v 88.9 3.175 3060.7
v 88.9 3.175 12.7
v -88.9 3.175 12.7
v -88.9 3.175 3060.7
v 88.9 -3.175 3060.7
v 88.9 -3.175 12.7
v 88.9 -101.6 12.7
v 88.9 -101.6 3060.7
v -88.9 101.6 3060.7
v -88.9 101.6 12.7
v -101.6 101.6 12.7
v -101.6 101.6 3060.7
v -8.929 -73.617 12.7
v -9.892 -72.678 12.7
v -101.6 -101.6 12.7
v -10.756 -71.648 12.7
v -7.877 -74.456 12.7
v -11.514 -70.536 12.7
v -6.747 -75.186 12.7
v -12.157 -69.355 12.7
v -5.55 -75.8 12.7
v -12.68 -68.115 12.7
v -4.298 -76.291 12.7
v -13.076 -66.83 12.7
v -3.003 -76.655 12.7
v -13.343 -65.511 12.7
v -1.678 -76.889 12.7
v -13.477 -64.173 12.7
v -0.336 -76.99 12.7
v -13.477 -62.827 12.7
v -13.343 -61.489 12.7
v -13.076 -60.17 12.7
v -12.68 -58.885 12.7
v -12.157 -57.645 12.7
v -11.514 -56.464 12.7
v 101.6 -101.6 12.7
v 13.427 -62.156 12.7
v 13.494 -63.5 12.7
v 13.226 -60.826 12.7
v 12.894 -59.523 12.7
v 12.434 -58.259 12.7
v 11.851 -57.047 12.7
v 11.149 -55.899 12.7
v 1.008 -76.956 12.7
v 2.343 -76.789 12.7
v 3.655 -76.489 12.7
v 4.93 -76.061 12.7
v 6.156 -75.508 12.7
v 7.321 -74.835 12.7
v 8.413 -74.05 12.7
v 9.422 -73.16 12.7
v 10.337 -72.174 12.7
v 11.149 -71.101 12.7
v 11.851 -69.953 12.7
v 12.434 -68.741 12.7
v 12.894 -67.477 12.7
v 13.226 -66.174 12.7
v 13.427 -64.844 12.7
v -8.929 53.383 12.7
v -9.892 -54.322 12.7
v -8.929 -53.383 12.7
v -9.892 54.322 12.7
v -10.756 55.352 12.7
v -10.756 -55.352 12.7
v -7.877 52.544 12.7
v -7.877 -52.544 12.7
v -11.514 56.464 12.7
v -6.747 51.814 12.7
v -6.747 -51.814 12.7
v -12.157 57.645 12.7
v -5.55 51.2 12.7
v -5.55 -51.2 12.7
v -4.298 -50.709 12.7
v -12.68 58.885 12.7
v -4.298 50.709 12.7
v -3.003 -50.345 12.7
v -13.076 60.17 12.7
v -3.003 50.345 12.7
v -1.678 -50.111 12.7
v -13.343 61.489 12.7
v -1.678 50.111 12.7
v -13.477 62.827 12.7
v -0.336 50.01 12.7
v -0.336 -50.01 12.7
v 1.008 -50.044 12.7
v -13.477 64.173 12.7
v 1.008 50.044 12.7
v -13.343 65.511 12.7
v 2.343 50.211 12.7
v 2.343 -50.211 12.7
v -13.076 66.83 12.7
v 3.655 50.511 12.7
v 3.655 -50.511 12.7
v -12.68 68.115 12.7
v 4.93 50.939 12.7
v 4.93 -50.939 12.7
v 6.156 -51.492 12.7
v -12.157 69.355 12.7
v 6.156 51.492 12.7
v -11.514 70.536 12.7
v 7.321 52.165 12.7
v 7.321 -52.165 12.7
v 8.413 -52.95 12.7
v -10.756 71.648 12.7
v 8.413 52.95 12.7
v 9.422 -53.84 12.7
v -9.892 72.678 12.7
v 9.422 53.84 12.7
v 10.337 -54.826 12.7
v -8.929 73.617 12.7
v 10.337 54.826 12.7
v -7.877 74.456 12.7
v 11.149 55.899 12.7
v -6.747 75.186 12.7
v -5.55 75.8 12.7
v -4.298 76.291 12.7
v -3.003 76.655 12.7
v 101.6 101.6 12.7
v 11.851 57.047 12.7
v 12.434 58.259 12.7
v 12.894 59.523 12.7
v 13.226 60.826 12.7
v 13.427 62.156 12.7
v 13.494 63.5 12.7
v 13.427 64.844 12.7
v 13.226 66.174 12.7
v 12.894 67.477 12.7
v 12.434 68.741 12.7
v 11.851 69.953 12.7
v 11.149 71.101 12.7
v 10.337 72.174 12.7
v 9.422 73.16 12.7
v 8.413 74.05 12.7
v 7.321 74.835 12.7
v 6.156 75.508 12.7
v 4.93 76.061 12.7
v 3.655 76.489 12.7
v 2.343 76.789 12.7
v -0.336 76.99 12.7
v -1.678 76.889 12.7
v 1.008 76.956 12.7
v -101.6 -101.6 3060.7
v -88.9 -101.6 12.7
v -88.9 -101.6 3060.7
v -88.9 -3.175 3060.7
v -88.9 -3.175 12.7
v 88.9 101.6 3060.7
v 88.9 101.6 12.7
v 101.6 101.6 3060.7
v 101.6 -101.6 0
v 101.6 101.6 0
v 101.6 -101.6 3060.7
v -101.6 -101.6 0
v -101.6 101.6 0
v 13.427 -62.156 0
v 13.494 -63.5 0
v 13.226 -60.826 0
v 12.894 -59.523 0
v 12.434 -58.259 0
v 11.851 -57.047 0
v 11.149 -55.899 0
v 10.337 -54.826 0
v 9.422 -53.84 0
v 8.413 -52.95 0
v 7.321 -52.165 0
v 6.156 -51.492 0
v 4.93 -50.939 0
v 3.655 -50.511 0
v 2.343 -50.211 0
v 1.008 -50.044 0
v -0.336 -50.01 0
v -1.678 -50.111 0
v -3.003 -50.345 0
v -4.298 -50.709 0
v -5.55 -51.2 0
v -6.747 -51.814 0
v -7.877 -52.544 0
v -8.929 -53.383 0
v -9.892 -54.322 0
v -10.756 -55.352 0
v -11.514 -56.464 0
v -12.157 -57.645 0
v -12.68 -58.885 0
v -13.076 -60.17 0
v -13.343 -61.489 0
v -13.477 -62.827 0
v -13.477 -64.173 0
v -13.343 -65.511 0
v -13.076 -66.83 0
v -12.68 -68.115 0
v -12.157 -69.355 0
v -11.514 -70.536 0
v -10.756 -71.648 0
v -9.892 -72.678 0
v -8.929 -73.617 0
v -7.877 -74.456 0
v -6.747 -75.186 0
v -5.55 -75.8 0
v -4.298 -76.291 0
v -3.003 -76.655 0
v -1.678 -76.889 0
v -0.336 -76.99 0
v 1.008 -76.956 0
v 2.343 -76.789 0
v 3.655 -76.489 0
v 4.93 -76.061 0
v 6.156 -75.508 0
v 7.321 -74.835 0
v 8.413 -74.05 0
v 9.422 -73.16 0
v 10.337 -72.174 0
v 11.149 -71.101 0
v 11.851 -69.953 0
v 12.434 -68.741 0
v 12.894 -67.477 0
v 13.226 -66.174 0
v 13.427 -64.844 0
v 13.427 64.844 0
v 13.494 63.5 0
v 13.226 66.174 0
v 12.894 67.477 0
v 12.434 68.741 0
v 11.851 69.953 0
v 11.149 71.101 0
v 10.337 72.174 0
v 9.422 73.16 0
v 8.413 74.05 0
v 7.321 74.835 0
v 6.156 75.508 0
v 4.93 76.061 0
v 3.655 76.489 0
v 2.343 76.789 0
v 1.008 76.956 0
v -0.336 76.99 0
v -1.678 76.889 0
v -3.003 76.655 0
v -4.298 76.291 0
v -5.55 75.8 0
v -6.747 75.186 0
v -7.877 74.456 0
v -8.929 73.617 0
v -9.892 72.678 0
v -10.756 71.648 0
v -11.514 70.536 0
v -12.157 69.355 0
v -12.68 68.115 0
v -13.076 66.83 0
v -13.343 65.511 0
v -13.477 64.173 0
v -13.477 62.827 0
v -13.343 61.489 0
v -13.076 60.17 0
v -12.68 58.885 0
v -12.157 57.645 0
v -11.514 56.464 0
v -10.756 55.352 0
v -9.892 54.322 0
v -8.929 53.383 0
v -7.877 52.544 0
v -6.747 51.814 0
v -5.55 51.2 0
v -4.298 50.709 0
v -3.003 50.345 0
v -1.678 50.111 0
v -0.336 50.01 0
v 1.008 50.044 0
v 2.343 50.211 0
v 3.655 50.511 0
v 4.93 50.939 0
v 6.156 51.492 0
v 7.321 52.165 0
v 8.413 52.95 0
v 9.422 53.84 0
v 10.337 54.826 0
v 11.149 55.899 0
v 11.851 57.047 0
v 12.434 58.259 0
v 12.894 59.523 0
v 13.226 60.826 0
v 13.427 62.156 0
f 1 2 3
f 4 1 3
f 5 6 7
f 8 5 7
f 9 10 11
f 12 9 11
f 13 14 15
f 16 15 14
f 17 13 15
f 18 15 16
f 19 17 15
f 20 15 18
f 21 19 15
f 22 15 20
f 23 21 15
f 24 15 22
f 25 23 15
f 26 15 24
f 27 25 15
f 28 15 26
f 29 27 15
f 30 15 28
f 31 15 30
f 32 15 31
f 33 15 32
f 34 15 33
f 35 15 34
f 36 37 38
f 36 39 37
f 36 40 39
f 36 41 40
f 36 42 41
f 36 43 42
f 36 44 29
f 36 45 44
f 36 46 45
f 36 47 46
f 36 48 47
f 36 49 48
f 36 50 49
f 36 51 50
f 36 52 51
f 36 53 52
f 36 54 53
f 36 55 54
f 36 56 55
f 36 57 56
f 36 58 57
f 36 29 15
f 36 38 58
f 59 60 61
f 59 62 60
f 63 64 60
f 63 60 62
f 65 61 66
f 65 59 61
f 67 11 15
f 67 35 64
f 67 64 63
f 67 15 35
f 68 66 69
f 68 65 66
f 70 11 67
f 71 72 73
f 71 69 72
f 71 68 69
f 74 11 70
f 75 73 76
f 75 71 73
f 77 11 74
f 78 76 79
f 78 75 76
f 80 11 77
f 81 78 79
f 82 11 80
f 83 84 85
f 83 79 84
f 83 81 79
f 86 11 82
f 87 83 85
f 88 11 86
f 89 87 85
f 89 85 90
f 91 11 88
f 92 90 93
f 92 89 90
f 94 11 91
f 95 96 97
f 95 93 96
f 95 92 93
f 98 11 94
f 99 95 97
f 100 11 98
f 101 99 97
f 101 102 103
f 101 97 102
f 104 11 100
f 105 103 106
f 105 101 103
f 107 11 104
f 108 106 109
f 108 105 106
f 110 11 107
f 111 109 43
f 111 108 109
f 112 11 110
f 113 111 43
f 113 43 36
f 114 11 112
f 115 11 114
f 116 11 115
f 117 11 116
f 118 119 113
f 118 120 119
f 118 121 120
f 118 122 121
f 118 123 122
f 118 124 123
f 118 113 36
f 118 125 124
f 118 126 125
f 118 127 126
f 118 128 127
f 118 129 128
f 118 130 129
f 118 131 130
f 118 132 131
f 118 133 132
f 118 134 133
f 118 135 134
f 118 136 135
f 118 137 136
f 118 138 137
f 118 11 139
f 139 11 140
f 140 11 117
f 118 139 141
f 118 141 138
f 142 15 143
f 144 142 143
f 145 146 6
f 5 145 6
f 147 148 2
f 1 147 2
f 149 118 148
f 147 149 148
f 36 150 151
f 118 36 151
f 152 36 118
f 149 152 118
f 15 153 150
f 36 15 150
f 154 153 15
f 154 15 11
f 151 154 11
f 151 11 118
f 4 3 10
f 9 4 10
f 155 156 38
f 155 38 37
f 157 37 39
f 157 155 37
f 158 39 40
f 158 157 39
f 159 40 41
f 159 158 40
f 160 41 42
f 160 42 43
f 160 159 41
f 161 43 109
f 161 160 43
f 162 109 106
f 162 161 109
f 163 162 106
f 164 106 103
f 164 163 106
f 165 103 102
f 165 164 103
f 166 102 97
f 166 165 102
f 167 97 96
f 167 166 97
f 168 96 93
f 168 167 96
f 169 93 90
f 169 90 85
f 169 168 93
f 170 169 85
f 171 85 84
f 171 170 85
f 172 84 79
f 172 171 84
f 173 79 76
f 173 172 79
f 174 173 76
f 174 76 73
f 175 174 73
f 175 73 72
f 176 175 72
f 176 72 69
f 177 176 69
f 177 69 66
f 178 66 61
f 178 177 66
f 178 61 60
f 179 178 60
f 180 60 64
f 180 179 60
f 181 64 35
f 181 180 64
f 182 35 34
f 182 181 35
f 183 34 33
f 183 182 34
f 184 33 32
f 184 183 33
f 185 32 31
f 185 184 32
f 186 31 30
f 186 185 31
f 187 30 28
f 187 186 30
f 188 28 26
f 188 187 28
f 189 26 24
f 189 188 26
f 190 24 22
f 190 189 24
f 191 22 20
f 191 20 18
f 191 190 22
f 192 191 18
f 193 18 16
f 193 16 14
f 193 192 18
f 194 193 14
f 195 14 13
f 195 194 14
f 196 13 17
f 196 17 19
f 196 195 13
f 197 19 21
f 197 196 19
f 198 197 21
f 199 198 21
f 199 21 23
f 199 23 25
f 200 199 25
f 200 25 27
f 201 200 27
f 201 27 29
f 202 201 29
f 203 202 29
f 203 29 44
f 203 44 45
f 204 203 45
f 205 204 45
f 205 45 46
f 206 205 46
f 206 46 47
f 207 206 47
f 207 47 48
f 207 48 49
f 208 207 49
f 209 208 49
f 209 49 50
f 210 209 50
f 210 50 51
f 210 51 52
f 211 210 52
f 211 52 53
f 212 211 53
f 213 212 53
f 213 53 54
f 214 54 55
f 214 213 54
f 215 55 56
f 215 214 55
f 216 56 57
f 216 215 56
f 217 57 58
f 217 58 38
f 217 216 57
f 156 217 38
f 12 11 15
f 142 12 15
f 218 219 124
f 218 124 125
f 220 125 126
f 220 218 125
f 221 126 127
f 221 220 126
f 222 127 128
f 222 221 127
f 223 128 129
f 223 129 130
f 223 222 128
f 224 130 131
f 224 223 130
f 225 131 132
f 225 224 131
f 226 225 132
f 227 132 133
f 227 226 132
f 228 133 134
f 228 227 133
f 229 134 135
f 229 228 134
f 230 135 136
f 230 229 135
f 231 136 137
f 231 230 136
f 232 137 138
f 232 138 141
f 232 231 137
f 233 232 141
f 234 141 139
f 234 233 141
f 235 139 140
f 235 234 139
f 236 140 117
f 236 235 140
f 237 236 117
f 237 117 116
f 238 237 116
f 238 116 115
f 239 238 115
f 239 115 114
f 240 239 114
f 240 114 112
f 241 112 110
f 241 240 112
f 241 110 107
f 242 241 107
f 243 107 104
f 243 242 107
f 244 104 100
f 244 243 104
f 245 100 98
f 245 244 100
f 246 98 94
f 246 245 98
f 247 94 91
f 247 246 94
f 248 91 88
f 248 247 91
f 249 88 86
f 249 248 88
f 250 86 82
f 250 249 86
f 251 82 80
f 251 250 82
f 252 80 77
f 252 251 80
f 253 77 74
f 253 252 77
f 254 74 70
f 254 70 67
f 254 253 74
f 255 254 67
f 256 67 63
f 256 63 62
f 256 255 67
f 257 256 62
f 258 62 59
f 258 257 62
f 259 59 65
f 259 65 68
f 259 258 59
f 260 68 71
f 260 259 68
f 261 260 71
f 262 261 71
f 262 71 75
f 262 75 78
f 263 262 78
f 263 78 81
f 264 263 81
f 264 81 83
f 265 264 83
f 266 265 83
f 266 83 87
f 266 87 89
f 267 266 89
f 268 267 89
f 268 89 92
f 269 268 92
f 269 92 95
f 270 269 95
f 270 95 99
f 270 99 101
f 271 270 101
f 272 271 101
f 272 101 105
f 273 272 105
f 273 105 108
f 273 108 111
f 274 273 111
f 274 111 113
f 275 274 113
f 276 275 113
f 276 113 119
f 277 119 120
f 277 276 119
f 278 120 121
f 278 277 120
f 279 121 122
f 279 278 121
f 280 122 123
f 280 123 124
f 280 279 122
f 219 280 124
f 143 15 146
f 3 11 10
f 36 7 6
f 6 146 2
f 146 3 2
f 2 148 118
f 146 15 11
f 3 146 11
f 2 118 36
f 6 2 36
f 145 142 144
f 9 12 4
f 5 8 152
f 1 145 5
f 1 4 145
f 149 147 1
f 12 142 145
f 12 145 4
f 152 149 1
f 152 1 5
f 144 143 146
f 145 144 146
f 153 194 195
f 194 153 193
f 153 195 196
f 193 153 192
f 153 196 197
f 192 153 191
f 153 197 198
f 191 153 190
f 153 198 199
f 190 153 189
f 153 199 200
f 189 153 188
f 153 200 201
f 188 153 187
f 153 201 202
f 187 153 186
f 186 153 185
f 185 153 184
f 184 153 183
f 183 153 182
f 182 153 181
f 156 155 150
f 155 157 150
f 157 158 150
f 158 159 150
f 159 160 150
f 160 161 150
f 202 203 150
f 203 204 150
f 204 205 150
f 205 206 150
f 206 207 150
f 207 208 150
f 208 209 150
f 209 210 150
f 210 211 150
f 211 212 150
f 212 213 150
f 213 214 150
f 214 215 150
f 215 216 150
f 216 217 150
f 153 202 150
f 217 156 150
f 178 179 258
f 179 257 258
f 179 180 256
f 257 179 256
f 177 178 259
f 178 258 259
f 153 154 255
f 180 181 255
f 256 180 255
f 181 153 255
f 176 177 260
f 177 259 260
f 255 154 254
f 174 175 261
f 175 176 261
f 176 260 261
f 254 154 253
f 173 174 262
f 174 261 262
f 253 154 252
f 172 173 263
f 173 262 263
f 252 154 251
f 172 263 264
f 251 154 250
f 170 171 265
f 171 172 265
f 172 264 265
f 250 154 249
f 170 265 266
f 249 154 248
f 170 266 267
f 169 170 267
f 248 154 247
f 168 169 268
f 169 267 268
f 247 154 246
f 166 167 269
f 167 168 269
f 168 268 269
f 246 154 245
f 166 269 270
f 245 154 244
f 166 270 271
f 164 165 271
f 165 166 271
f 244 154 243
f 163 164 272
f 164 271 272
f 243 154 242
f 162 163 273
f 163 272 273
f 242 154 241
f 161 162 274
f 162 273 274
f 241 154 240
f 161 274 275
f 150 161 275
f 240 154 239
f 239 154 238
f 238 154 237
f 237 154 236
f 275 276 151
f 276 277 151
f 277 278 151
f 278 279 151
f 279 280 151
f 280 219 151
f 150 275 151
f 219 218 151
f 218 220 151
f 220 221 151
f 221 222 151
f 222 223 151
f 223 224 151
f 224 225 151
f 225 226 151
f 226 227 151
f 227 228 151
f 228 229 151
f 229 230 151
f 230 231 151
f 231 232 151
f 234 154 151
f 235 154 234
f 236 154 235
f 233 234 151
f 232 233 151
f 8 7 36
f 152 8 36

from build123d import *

# Parameters (mm, degrees)
F0_W     = 203.2
F0_H     = 203.2
F0_R     = 13.49375
F1_DEPTH = 12.7
F3_DEPTH = 3048


with BuildPart() as f1:
    # F0 (on Top) → F1 (new body)
    with BuildSketch(Plane.XY):
        Rectangle(F0_W, F0_H)
        with Locations((0, -63.5)):
            Circle(F0_R, mode=Mode.SUBTRACT)
        with Locations((0, 63.5)):
            Circle(F0_R, mode=Mode.SUBTRACT)
    extrude(amount=F1_DEPTH)


with BuildPart() as f3:
    # F2 (on face) → F3 (new body)
    with BuildSketch(Plane.XY.offset(12.7)):
        Polygon((-88.9, 101.6), (-101.6, 101.6), (-101.6, -101.6), (-88.9, -101.6), (-88.9, -3.175), (88.9, -3.175), (88.9, -101.6), (101.6, -101.6), (101.6, 101.6), (88.9, 101.6), (88.9, 3.175), (-88.9, 3.175), align=None)
    extrude(amount=F3_DEPTH)


solid = Compound([f1.part, f3.part])
